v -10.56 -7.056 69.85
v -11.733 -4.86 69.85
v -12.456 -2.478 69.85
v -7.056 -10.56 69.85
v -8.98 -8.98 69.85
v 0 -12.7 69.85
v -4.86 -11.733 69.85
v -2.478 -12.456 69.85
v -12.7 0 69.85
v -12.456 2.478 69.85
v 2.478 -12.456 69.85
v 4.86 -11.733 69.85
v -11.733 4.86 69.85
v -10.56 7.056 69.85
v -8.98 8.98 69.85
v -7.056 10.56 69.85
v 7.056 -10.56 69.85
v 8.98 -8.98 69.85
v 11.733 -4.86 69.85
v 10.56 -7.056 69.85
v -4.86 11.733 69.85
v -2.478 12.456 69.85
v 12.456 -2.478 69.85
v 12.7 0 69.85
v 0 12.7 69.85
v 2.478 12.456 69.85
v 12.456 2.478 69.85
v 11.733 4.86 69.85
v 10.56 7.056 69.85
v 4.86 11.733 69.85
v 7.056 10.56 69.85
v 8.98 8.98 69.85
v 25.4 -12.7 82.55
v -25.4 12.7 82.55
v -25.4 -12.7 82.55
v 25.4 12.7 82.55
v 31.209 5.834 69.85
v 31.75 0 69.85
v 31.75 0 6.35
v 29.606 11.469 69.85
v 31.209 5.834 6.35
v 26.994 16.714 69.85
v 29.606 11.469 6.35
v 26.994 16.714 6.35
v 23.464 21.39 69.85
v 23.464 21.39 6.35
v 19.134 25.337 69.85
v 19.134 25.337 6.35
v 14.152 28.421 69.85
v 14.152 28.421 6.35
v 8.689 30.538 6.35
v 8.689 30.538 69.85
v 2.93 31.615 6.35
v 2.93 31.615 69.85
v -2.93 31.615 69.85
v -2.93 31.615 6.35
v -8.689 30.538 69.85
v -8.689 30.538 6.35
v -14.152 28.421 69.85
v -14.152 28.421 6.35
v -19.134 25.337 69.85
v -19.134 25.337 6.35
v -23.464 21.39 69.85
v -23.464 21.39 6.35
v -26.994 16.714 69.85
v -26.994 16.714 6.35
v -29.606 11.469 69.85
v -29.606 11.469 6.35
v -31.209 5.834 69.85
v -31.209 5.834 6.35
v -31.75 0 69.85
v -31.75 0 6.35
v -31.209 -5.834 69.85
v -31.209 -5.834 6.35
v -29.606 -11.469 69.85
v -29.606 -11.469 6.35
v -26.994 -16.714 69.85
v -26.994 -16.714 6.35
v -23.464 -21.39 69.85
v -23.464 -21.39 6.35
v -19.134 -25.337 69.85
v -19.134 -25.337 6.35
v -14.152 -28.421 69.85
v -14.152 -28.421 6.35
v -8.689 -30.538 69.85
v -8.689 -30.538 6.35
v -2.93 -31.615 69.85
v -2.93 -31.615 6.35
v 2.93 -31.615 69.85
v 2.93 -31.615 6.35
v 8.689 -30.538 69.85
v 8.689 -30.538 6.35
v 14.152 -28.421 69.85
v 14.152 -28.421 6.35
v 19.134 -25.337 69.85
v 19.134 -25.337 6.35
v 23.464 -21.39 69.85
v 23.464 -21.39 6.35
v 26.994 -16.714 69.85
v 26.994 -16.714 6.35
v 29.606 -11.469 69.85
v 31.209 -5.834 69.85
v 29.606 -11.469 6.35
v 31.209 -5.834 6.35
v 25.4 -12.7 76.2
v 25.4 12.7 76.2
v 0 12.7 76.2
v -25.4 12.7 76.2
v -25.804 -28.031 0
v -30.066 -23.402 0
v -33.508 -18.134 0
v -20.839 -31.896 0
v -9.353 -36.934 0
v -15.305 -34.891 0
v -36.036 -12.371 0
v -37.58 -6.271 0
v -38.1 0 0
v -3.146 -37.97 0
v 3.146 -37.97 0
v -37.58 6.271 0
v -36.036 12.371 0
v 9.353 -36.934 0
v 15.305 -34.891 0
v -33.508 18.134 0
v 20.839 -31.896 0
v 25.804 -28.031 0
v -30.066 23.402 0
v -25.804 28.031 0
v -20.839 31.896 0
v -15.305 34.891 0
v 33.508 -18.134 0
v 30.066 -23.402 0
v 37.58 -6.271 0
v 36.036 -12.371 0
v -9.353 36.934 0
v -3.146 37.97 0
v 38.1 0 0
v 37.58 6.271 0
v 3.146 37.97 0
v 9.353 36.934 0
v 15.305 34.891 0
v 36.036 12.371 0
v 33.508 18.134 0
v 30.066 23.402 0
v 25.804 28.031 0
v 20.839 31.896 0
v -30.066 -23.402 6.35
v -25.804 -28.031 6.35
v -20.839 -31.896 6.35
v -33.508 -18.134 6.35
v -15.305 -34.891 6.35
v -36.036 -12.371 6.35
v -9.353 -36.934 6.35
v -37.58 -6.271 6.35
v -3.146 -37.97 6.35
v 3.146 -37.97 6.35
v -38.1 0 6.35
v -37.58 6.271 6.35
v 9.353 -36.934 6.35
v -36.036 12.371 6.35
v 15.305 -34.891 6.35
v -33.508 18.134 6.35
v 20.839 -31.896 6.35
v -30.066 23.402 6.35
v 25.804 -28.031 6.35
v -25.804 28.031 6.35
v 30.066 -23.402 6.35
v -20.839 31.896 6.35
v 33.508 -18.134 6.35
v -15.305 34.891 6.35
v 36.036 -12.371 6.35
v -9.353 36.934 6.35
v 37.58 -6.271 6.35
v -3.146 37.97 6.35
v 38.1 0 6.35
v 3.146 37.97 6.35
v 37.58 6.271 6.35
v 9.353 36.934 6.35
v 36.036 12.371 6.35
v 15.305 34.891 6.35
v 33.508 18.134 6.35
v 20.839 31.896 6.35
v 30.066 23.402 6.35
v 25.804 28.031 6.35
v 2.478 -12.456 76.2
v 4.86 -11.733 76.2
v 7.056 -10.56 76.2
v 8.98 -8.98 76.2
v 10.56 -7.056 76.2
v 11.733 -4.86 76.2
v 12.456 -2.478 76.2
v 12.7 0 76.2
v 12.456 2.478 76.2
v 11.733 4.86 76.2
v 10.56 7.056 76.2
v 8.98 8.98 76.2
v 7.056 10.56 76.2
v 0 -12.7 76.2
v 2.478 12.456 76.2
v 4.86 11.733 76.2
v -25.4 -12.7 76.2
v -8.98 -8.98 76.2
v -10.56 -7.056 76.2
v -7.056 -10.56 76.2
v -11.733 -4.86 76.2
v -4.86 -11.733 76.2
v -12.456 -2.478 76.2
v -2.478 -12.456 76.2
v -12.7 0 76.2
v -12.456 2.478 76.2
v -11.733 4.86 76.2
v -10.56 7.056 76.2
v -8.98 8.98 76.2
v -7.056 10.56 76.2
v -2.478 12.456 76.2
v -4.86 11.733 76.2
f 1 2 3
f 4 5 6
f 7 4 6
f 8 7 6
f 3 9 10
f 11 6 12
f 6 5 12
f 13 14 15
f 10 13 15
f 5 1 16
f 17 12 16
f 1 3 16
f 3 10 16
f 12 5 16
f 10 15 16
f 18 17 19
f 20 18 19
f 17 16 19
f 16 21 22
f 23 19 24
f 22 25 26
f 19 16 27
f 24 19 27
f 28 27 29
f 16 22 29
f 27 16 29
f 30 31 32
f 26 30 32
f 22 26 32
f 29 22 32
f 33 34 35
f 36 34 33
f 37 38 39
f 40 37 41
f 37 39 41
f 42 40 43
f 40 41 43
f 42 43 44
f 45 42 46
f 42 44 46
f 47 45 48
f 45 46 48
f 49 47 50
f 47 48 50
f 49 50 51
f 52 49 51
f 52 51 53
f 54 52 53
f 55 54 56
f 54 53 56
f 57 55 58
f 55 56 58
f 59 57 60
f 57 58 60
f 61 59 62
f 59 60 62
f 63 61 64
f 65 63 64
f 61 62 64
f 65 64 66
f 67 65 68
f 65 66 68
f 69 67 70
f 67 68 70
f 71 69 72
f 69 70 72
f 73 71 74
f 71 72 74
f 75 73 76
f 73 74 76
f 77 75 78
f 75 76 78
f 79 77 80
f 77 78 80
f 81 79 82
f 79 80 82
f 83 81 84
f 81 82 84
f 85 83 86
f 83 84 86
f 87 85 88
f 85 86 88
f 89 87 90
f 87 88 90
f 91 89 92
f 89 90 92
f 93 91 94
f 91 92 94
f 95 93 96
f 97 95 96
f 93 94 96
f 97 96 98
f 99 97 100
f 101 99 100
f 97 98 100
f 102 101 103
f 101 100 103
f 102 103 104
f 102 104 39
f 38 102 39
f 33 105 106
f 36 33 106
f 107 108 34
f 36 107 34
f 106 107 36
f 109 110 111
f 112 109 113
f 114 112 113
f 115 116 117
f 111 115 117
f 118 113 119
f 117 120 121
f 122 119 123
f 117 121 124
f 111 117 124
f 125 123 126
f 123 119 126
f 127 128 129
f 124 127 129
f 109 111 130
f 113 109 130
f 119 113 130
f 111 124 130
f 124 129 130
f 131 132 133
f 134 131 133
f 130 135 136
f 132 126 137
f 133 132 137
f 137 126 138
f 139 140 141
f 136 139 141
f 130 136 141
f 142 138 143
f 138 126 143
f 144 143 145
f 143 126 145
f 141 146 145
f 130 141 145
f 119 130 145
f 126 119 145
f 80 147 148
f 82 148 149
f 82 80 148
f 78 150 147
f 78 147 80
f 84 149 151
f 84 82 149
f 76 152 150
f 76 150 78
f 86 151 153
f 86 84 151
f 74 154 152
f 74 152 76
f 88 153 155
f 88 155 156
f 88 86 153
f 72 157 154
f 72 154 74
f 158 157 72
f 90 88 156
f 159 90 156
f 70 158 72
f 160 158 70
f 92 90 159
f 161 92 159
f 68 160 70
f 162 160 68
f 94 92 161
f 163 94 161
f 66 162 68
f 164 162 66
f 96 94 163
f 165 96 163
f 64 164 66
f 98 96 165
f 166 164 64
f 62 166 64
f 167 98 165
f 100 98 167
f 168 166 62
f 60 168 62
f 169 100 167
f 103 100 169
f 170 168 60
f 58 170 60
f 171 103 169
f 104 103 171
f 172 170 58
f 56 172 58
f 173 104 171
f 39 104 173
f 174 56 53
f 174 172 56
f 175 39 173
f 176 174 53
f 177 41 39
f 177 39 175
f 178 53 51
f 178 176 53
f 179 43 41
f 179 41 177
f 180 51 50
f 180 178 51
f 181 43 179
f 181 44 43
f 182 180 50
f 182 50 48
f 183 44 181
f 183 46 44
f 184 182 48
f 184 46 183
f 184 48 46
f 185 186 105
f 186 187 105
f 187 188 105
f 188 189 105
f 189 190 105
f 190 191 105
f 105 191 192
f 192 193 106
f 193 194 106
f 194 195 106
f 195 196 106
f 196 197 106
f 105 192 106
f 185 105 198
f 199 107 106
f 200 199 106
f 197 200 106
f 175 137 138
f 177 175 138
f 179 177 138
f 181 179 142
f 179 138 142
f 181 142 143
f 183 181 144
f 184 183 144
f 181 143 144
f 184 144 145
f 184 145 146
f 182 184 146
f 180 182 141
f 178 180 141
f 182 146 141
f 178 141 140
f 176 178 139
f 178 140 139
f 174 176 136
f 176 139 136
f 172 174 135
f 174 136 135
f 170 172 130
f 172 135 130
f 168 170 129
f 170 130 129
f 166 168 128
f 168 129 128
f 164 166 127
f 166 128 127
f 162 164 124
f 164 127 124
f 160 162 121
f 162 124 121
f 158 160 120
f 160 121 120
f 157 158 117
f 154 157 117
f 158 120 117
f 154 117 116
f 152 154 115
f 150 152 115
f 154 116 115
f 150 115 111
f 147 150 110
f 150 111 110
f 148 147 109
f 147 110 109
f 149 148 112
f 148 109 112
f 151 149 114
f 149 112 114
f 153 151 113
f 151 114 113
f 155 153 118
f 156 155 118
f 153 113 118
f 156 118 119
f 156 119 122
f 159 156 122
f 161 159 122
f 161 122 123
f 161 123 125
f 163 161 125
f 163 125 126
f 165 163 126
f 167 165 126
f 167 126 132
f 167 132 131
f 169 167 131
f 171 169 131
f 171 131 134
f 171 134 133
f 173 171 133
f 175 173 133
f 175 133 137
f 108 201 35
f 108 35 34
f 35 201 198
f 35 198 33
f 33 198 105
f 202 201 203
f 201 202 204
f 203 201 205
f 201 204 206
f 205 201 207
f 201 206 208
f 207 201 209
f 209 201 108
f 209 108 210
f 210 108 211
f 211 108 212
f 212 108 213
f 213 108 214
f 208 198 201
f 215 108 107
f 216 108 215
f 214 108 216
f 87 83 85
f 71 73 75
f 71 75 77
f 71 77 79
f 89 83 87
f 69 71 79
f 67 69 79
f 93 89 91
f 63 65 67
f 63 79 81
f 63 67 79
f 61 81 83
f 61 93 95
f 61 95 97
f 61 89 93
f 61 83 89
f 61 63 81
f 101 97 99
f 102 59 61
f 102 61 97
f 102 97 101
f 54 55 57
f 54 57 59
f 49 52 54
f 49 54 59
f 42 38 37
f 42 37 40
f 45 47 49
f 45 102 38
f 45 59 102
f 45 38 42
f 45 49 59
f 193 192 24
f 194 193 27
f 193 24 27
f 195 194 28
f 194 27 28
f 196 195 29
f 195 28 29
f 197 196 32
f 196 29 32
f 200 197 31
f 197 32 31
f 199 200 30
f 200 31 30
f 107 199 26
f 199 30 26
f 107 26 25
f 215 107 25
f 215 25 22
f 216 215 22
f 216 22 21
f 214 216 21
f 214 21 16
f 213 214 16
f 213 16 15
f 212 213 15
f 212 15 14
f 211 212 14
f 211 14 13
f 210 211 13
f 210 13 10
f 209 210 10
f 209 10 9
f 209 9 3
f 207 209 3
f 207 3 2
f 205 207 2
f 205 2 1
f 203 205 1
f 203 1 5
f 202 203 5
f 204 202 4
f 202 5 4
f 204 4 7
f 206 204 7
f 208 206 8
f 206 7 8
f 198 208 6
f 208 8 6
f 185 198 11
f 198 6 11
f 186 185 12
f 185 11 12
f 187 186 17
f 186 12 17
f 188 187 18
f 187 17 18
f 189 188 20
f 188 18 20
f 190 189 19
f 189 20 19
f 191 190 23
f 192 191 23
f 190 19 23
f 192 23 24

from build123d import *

# Parameters (mm, degrees)
F0_R     = 38.1
F1_DEPTH = 6.35
F2_R     = 31.75
F3_DEPTH = 63.5
F4_R     = 12.7
F5_DEPTH = 6.35
F6_W     = 50.8
F6_H     = 25.4
F7_DEPTH = 6.35


with BuildPart() as f1:
    # F0 (on Top) → F1 (new body)
    with BuildSketch(Plane.XY):
        Circle(F0_R)
    extrude(amount=F1_DEPTH)

    # F2 (on face) → F3 (join)
    with BuildSketch(Plane.XY.offset(6.35)):
        Circle(F2_R)
    extrude(amount=F3_DEPTH)


with BuildPart() as f5:
    # F4 (on face) → F5 (new body)
    with BuildSketch(Plane.XY.offset(69.85)):
        Circle(F4_R)
    extrude(amount=F5_DEPTH)

    # F6 (on face) → F7 (join)
    with BuildSketch(Plane.XY.offset(76.2)):
        Rectangle(F6_W, F6_H)
    extrude(amount=F7_DEPTH)


solid = Compound([f1.part, f5.part])
